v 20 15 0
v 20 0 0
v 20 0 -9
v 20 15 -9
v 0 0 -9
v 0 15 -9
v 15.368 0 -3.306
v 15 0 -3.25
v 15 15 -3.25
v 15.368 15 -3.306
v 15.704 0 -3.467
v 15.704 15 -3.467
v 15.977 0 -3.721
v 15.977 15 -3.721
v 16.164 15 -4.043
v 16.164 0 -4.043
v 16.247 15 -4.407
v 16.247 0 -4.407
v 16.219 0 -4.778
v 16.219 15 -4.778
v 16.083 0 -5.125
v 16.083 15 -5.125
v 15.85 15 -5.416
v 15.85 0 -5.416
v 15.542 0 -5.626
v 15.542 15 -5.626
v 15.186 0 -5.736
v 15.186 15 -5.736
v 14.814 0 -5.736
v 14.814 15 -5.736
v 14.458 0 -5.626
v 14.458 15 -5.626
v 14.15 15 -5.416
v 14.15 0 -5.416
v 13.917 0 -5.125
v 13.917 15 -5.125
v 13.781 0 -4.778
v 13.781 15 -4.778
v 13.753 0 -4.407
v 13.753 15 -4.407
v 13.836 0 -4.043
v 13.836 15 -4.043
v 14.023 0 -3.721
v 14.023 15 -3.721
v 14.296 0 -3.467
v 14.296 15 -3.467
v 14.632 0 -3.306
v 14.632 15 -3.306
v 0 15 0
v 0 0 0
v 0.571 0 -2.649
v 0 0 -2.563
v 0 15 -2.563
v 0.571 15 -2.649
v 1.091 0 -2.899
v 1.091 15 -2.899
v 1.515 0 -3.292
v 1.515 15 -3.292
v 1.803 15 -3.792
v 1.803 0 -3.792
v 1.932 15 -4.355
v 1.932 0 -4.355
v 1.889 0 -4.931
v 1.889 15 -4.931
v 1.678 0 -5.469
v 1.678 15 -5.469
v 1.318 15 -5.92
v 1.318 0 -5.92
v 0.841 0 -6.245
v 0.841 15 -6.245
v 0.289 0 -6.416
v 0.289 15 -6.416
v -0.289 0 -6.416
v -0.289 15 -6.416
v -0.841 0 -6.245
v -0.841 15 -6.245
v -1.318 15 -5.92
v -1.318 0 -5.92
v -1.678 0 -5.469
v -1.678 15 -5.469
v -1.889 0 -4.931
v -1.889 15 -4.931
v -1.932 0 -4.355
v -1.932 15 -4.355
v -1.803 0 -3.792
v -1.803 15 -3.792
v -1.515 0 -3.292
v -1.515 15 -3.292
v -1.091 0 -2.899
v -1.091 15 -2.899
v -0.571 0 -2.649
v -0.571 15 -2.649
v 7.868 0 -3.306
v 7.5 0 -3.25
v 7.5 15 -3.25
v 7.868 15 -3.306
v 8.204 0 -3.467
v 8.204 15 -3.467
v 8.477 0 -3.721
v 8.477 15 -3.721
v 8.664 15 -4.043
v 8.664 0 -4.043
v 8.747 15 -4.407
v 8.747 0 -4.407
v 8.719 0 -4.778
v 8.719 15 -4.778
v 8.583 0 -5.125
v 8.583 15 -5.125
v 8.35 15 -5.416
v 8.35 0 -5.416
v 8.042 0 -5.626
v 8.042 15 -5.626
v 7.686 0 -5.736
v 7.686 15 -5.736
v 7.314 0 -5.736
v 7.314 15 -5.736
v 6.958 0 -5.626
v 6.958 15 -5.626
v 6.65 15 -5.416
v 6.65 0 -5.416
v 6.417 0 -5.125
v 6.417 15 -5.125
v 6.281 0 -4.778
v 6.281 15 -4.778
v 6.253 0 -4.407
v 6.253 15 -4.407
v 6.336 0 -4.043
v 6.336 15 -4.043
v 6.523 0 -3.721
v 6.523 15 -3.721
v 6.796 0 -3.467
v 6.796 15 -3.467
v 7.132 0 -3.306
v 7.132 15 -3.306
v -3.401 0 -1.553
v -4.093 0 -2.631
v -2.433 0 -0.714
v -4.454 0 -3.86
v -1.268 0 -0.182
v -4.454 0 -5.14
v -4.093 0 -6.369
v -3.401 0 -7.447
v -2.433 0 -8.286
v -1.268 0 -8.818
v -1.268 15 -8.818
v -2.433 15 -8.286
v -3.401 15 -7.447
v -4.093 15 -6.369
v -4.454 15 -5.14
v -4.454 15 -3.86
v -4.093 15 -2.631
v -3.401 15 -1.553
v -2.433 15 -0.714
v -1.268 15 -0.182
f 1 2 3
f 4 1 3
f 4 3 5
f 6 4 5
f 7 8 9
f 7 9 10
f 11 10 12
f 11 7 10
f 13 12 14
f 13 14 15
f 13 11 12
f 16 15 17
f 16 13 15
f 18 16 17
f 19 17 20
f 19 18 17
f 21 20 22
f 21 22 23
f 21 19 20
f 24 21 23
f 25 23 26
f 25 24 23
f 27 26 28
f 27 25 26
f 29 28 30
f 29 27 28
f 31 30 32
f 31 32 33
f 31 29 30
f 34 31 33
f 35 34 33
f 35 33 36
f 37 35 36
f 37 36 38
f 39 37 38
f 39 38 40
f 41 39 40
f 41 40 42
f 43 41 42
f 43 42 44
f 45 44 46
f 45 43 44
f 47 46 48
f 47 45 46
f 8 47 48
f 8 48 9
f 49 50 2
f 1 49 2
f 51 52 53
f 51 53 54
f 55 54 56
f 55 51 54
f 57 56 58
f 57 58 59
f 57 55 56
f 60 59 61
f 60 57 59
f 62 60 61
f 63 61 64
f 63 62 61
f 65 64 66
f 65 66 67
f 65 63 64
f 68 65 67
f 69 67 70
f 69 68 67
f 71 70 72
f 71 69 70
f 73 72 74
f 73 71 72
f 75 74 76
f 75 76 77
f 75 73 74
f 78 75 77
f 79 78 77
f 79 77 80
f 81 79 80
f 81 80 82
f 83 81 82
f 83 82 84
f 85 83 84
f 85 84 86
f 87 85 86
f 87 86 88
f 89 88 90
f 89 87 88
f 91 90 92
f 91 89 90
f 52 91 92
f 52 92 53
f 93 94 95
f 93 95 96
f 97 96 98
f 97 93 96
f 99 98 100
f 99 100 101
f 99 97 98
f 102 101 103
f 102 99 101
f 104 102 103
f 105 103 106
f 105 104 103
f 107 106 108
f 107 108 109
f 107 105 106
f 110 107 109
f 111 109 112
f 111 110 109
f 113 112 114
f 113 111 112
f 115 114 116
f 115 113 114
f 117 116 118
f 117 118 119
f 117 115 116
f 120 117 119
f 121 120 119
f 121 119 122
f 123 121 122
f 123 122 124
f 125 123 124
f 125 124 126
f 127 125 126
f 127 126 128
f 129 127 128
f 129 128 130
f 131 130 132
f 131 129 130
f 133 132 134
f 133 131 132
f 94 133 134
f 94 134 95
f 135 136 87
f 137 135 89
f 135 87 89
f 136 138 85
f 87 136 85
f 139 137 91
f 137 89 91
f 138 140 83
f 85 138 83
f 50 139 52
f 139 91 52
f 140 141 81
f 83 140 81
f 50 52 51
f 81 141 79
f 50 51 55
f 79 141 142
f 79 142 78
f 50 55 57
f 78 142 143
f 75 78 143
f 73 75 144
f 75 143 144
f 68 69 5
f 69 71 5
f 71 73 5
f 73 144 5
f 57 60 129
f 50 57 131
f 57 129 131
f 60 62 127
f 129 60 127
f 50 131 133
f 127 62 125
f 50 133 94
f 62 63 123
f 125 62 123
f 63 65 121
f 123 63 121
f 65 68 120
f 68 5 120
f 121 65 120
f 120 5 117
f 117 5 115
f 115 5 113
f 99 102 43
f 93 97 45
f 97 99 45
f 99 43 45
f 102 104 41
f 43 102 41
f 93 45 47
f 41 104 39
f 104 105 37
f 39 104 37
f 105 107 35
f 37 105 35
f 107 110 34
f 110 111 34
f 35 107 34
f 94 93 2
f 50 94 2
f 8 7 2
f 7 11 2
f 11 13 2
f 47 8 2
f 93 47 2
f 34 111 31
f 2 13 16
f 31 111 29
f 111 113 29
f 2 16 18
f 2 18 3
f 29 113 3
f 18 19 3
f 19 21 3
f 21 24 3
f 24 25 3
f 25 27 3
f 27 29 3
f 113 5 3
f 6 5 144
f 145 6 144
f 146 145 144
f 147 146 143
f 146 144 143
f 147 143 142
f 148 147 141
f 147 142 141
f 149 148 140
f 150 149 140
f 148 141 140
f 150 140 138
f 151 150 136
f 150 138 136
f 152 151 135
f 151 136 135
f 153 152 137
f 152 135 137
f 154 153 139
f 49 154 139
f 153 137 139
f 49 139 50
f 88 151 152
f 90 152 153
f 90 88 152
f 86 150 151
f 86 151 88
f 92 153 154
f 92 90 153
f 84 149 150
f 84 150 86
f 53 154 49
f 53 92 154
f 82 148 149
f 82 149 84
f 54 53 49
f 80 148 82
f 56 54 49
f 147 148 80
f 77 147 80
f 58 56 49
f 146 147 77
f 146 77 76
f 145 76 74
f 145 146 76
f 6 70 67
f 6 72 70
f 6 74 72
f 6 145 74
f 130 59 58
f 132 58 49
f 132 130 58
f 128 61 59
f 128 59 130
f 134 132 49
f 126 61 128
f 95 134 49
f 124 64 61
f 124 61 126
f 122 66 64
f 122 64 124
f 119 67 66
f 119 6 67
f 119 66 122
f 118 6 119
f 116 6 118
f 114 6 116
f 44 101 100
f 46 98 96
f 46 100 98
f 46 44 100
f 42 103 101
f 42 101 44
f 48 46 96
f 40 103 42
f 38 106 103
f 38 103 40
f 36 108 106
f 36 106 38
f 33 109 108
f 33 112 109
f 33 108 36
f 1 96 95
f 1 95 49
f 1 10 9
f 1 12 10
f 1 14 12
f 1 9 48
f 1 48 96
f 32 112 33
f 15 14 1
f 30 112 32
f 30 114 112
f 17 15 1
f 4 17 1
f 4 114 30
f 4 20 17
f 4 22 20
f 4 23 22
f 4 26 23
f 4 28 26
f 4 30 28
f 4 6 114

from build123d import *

# Parameters (mm, degrees)
SKETCH2_R           = 1.937236025
SKETCH2_R_2         = 1.25
BOSS_EXTRUDE2_DEPTH = 15


with BuildPart() as part:
    # Sketch2 → Boss-Extrude2 (new body)
    with BuildSketch(Plane(origin=(0, 0, 0), x_dir=(1, 0, 0), z_dir=(0, 1, 0))):
        with BuildLine():
            Line((20, 9), (0, 9))
            ThreePointArc((0, 9), (-4.5, 4.5), (0, 0))
            Line((0, 0), (20, 0))
            Line((20, 0), (20, 9))
        make_face()
        with Locations((0, 4.5)):
            Circle(SKETCH2_R, mode=Mode.SUBTRACT)
        with BuildLine():
            ThreePointArc((8.75, 4.5), (7.5, 3.25), (6.25, 4.5))
            ThreePointArc((6.25, 4.5), (7.5, 5.75), (8.75, 4.5))
        make_face(mode=Mode.SUBTRACT)
        with Locations((15, 4.5)):
            Circle(SKETCH2_R_2, mode=Mode.SUBTRACT)
    extrude(amount=BOSS_EXTRUDE2_DEPTH)


solid = part.part
